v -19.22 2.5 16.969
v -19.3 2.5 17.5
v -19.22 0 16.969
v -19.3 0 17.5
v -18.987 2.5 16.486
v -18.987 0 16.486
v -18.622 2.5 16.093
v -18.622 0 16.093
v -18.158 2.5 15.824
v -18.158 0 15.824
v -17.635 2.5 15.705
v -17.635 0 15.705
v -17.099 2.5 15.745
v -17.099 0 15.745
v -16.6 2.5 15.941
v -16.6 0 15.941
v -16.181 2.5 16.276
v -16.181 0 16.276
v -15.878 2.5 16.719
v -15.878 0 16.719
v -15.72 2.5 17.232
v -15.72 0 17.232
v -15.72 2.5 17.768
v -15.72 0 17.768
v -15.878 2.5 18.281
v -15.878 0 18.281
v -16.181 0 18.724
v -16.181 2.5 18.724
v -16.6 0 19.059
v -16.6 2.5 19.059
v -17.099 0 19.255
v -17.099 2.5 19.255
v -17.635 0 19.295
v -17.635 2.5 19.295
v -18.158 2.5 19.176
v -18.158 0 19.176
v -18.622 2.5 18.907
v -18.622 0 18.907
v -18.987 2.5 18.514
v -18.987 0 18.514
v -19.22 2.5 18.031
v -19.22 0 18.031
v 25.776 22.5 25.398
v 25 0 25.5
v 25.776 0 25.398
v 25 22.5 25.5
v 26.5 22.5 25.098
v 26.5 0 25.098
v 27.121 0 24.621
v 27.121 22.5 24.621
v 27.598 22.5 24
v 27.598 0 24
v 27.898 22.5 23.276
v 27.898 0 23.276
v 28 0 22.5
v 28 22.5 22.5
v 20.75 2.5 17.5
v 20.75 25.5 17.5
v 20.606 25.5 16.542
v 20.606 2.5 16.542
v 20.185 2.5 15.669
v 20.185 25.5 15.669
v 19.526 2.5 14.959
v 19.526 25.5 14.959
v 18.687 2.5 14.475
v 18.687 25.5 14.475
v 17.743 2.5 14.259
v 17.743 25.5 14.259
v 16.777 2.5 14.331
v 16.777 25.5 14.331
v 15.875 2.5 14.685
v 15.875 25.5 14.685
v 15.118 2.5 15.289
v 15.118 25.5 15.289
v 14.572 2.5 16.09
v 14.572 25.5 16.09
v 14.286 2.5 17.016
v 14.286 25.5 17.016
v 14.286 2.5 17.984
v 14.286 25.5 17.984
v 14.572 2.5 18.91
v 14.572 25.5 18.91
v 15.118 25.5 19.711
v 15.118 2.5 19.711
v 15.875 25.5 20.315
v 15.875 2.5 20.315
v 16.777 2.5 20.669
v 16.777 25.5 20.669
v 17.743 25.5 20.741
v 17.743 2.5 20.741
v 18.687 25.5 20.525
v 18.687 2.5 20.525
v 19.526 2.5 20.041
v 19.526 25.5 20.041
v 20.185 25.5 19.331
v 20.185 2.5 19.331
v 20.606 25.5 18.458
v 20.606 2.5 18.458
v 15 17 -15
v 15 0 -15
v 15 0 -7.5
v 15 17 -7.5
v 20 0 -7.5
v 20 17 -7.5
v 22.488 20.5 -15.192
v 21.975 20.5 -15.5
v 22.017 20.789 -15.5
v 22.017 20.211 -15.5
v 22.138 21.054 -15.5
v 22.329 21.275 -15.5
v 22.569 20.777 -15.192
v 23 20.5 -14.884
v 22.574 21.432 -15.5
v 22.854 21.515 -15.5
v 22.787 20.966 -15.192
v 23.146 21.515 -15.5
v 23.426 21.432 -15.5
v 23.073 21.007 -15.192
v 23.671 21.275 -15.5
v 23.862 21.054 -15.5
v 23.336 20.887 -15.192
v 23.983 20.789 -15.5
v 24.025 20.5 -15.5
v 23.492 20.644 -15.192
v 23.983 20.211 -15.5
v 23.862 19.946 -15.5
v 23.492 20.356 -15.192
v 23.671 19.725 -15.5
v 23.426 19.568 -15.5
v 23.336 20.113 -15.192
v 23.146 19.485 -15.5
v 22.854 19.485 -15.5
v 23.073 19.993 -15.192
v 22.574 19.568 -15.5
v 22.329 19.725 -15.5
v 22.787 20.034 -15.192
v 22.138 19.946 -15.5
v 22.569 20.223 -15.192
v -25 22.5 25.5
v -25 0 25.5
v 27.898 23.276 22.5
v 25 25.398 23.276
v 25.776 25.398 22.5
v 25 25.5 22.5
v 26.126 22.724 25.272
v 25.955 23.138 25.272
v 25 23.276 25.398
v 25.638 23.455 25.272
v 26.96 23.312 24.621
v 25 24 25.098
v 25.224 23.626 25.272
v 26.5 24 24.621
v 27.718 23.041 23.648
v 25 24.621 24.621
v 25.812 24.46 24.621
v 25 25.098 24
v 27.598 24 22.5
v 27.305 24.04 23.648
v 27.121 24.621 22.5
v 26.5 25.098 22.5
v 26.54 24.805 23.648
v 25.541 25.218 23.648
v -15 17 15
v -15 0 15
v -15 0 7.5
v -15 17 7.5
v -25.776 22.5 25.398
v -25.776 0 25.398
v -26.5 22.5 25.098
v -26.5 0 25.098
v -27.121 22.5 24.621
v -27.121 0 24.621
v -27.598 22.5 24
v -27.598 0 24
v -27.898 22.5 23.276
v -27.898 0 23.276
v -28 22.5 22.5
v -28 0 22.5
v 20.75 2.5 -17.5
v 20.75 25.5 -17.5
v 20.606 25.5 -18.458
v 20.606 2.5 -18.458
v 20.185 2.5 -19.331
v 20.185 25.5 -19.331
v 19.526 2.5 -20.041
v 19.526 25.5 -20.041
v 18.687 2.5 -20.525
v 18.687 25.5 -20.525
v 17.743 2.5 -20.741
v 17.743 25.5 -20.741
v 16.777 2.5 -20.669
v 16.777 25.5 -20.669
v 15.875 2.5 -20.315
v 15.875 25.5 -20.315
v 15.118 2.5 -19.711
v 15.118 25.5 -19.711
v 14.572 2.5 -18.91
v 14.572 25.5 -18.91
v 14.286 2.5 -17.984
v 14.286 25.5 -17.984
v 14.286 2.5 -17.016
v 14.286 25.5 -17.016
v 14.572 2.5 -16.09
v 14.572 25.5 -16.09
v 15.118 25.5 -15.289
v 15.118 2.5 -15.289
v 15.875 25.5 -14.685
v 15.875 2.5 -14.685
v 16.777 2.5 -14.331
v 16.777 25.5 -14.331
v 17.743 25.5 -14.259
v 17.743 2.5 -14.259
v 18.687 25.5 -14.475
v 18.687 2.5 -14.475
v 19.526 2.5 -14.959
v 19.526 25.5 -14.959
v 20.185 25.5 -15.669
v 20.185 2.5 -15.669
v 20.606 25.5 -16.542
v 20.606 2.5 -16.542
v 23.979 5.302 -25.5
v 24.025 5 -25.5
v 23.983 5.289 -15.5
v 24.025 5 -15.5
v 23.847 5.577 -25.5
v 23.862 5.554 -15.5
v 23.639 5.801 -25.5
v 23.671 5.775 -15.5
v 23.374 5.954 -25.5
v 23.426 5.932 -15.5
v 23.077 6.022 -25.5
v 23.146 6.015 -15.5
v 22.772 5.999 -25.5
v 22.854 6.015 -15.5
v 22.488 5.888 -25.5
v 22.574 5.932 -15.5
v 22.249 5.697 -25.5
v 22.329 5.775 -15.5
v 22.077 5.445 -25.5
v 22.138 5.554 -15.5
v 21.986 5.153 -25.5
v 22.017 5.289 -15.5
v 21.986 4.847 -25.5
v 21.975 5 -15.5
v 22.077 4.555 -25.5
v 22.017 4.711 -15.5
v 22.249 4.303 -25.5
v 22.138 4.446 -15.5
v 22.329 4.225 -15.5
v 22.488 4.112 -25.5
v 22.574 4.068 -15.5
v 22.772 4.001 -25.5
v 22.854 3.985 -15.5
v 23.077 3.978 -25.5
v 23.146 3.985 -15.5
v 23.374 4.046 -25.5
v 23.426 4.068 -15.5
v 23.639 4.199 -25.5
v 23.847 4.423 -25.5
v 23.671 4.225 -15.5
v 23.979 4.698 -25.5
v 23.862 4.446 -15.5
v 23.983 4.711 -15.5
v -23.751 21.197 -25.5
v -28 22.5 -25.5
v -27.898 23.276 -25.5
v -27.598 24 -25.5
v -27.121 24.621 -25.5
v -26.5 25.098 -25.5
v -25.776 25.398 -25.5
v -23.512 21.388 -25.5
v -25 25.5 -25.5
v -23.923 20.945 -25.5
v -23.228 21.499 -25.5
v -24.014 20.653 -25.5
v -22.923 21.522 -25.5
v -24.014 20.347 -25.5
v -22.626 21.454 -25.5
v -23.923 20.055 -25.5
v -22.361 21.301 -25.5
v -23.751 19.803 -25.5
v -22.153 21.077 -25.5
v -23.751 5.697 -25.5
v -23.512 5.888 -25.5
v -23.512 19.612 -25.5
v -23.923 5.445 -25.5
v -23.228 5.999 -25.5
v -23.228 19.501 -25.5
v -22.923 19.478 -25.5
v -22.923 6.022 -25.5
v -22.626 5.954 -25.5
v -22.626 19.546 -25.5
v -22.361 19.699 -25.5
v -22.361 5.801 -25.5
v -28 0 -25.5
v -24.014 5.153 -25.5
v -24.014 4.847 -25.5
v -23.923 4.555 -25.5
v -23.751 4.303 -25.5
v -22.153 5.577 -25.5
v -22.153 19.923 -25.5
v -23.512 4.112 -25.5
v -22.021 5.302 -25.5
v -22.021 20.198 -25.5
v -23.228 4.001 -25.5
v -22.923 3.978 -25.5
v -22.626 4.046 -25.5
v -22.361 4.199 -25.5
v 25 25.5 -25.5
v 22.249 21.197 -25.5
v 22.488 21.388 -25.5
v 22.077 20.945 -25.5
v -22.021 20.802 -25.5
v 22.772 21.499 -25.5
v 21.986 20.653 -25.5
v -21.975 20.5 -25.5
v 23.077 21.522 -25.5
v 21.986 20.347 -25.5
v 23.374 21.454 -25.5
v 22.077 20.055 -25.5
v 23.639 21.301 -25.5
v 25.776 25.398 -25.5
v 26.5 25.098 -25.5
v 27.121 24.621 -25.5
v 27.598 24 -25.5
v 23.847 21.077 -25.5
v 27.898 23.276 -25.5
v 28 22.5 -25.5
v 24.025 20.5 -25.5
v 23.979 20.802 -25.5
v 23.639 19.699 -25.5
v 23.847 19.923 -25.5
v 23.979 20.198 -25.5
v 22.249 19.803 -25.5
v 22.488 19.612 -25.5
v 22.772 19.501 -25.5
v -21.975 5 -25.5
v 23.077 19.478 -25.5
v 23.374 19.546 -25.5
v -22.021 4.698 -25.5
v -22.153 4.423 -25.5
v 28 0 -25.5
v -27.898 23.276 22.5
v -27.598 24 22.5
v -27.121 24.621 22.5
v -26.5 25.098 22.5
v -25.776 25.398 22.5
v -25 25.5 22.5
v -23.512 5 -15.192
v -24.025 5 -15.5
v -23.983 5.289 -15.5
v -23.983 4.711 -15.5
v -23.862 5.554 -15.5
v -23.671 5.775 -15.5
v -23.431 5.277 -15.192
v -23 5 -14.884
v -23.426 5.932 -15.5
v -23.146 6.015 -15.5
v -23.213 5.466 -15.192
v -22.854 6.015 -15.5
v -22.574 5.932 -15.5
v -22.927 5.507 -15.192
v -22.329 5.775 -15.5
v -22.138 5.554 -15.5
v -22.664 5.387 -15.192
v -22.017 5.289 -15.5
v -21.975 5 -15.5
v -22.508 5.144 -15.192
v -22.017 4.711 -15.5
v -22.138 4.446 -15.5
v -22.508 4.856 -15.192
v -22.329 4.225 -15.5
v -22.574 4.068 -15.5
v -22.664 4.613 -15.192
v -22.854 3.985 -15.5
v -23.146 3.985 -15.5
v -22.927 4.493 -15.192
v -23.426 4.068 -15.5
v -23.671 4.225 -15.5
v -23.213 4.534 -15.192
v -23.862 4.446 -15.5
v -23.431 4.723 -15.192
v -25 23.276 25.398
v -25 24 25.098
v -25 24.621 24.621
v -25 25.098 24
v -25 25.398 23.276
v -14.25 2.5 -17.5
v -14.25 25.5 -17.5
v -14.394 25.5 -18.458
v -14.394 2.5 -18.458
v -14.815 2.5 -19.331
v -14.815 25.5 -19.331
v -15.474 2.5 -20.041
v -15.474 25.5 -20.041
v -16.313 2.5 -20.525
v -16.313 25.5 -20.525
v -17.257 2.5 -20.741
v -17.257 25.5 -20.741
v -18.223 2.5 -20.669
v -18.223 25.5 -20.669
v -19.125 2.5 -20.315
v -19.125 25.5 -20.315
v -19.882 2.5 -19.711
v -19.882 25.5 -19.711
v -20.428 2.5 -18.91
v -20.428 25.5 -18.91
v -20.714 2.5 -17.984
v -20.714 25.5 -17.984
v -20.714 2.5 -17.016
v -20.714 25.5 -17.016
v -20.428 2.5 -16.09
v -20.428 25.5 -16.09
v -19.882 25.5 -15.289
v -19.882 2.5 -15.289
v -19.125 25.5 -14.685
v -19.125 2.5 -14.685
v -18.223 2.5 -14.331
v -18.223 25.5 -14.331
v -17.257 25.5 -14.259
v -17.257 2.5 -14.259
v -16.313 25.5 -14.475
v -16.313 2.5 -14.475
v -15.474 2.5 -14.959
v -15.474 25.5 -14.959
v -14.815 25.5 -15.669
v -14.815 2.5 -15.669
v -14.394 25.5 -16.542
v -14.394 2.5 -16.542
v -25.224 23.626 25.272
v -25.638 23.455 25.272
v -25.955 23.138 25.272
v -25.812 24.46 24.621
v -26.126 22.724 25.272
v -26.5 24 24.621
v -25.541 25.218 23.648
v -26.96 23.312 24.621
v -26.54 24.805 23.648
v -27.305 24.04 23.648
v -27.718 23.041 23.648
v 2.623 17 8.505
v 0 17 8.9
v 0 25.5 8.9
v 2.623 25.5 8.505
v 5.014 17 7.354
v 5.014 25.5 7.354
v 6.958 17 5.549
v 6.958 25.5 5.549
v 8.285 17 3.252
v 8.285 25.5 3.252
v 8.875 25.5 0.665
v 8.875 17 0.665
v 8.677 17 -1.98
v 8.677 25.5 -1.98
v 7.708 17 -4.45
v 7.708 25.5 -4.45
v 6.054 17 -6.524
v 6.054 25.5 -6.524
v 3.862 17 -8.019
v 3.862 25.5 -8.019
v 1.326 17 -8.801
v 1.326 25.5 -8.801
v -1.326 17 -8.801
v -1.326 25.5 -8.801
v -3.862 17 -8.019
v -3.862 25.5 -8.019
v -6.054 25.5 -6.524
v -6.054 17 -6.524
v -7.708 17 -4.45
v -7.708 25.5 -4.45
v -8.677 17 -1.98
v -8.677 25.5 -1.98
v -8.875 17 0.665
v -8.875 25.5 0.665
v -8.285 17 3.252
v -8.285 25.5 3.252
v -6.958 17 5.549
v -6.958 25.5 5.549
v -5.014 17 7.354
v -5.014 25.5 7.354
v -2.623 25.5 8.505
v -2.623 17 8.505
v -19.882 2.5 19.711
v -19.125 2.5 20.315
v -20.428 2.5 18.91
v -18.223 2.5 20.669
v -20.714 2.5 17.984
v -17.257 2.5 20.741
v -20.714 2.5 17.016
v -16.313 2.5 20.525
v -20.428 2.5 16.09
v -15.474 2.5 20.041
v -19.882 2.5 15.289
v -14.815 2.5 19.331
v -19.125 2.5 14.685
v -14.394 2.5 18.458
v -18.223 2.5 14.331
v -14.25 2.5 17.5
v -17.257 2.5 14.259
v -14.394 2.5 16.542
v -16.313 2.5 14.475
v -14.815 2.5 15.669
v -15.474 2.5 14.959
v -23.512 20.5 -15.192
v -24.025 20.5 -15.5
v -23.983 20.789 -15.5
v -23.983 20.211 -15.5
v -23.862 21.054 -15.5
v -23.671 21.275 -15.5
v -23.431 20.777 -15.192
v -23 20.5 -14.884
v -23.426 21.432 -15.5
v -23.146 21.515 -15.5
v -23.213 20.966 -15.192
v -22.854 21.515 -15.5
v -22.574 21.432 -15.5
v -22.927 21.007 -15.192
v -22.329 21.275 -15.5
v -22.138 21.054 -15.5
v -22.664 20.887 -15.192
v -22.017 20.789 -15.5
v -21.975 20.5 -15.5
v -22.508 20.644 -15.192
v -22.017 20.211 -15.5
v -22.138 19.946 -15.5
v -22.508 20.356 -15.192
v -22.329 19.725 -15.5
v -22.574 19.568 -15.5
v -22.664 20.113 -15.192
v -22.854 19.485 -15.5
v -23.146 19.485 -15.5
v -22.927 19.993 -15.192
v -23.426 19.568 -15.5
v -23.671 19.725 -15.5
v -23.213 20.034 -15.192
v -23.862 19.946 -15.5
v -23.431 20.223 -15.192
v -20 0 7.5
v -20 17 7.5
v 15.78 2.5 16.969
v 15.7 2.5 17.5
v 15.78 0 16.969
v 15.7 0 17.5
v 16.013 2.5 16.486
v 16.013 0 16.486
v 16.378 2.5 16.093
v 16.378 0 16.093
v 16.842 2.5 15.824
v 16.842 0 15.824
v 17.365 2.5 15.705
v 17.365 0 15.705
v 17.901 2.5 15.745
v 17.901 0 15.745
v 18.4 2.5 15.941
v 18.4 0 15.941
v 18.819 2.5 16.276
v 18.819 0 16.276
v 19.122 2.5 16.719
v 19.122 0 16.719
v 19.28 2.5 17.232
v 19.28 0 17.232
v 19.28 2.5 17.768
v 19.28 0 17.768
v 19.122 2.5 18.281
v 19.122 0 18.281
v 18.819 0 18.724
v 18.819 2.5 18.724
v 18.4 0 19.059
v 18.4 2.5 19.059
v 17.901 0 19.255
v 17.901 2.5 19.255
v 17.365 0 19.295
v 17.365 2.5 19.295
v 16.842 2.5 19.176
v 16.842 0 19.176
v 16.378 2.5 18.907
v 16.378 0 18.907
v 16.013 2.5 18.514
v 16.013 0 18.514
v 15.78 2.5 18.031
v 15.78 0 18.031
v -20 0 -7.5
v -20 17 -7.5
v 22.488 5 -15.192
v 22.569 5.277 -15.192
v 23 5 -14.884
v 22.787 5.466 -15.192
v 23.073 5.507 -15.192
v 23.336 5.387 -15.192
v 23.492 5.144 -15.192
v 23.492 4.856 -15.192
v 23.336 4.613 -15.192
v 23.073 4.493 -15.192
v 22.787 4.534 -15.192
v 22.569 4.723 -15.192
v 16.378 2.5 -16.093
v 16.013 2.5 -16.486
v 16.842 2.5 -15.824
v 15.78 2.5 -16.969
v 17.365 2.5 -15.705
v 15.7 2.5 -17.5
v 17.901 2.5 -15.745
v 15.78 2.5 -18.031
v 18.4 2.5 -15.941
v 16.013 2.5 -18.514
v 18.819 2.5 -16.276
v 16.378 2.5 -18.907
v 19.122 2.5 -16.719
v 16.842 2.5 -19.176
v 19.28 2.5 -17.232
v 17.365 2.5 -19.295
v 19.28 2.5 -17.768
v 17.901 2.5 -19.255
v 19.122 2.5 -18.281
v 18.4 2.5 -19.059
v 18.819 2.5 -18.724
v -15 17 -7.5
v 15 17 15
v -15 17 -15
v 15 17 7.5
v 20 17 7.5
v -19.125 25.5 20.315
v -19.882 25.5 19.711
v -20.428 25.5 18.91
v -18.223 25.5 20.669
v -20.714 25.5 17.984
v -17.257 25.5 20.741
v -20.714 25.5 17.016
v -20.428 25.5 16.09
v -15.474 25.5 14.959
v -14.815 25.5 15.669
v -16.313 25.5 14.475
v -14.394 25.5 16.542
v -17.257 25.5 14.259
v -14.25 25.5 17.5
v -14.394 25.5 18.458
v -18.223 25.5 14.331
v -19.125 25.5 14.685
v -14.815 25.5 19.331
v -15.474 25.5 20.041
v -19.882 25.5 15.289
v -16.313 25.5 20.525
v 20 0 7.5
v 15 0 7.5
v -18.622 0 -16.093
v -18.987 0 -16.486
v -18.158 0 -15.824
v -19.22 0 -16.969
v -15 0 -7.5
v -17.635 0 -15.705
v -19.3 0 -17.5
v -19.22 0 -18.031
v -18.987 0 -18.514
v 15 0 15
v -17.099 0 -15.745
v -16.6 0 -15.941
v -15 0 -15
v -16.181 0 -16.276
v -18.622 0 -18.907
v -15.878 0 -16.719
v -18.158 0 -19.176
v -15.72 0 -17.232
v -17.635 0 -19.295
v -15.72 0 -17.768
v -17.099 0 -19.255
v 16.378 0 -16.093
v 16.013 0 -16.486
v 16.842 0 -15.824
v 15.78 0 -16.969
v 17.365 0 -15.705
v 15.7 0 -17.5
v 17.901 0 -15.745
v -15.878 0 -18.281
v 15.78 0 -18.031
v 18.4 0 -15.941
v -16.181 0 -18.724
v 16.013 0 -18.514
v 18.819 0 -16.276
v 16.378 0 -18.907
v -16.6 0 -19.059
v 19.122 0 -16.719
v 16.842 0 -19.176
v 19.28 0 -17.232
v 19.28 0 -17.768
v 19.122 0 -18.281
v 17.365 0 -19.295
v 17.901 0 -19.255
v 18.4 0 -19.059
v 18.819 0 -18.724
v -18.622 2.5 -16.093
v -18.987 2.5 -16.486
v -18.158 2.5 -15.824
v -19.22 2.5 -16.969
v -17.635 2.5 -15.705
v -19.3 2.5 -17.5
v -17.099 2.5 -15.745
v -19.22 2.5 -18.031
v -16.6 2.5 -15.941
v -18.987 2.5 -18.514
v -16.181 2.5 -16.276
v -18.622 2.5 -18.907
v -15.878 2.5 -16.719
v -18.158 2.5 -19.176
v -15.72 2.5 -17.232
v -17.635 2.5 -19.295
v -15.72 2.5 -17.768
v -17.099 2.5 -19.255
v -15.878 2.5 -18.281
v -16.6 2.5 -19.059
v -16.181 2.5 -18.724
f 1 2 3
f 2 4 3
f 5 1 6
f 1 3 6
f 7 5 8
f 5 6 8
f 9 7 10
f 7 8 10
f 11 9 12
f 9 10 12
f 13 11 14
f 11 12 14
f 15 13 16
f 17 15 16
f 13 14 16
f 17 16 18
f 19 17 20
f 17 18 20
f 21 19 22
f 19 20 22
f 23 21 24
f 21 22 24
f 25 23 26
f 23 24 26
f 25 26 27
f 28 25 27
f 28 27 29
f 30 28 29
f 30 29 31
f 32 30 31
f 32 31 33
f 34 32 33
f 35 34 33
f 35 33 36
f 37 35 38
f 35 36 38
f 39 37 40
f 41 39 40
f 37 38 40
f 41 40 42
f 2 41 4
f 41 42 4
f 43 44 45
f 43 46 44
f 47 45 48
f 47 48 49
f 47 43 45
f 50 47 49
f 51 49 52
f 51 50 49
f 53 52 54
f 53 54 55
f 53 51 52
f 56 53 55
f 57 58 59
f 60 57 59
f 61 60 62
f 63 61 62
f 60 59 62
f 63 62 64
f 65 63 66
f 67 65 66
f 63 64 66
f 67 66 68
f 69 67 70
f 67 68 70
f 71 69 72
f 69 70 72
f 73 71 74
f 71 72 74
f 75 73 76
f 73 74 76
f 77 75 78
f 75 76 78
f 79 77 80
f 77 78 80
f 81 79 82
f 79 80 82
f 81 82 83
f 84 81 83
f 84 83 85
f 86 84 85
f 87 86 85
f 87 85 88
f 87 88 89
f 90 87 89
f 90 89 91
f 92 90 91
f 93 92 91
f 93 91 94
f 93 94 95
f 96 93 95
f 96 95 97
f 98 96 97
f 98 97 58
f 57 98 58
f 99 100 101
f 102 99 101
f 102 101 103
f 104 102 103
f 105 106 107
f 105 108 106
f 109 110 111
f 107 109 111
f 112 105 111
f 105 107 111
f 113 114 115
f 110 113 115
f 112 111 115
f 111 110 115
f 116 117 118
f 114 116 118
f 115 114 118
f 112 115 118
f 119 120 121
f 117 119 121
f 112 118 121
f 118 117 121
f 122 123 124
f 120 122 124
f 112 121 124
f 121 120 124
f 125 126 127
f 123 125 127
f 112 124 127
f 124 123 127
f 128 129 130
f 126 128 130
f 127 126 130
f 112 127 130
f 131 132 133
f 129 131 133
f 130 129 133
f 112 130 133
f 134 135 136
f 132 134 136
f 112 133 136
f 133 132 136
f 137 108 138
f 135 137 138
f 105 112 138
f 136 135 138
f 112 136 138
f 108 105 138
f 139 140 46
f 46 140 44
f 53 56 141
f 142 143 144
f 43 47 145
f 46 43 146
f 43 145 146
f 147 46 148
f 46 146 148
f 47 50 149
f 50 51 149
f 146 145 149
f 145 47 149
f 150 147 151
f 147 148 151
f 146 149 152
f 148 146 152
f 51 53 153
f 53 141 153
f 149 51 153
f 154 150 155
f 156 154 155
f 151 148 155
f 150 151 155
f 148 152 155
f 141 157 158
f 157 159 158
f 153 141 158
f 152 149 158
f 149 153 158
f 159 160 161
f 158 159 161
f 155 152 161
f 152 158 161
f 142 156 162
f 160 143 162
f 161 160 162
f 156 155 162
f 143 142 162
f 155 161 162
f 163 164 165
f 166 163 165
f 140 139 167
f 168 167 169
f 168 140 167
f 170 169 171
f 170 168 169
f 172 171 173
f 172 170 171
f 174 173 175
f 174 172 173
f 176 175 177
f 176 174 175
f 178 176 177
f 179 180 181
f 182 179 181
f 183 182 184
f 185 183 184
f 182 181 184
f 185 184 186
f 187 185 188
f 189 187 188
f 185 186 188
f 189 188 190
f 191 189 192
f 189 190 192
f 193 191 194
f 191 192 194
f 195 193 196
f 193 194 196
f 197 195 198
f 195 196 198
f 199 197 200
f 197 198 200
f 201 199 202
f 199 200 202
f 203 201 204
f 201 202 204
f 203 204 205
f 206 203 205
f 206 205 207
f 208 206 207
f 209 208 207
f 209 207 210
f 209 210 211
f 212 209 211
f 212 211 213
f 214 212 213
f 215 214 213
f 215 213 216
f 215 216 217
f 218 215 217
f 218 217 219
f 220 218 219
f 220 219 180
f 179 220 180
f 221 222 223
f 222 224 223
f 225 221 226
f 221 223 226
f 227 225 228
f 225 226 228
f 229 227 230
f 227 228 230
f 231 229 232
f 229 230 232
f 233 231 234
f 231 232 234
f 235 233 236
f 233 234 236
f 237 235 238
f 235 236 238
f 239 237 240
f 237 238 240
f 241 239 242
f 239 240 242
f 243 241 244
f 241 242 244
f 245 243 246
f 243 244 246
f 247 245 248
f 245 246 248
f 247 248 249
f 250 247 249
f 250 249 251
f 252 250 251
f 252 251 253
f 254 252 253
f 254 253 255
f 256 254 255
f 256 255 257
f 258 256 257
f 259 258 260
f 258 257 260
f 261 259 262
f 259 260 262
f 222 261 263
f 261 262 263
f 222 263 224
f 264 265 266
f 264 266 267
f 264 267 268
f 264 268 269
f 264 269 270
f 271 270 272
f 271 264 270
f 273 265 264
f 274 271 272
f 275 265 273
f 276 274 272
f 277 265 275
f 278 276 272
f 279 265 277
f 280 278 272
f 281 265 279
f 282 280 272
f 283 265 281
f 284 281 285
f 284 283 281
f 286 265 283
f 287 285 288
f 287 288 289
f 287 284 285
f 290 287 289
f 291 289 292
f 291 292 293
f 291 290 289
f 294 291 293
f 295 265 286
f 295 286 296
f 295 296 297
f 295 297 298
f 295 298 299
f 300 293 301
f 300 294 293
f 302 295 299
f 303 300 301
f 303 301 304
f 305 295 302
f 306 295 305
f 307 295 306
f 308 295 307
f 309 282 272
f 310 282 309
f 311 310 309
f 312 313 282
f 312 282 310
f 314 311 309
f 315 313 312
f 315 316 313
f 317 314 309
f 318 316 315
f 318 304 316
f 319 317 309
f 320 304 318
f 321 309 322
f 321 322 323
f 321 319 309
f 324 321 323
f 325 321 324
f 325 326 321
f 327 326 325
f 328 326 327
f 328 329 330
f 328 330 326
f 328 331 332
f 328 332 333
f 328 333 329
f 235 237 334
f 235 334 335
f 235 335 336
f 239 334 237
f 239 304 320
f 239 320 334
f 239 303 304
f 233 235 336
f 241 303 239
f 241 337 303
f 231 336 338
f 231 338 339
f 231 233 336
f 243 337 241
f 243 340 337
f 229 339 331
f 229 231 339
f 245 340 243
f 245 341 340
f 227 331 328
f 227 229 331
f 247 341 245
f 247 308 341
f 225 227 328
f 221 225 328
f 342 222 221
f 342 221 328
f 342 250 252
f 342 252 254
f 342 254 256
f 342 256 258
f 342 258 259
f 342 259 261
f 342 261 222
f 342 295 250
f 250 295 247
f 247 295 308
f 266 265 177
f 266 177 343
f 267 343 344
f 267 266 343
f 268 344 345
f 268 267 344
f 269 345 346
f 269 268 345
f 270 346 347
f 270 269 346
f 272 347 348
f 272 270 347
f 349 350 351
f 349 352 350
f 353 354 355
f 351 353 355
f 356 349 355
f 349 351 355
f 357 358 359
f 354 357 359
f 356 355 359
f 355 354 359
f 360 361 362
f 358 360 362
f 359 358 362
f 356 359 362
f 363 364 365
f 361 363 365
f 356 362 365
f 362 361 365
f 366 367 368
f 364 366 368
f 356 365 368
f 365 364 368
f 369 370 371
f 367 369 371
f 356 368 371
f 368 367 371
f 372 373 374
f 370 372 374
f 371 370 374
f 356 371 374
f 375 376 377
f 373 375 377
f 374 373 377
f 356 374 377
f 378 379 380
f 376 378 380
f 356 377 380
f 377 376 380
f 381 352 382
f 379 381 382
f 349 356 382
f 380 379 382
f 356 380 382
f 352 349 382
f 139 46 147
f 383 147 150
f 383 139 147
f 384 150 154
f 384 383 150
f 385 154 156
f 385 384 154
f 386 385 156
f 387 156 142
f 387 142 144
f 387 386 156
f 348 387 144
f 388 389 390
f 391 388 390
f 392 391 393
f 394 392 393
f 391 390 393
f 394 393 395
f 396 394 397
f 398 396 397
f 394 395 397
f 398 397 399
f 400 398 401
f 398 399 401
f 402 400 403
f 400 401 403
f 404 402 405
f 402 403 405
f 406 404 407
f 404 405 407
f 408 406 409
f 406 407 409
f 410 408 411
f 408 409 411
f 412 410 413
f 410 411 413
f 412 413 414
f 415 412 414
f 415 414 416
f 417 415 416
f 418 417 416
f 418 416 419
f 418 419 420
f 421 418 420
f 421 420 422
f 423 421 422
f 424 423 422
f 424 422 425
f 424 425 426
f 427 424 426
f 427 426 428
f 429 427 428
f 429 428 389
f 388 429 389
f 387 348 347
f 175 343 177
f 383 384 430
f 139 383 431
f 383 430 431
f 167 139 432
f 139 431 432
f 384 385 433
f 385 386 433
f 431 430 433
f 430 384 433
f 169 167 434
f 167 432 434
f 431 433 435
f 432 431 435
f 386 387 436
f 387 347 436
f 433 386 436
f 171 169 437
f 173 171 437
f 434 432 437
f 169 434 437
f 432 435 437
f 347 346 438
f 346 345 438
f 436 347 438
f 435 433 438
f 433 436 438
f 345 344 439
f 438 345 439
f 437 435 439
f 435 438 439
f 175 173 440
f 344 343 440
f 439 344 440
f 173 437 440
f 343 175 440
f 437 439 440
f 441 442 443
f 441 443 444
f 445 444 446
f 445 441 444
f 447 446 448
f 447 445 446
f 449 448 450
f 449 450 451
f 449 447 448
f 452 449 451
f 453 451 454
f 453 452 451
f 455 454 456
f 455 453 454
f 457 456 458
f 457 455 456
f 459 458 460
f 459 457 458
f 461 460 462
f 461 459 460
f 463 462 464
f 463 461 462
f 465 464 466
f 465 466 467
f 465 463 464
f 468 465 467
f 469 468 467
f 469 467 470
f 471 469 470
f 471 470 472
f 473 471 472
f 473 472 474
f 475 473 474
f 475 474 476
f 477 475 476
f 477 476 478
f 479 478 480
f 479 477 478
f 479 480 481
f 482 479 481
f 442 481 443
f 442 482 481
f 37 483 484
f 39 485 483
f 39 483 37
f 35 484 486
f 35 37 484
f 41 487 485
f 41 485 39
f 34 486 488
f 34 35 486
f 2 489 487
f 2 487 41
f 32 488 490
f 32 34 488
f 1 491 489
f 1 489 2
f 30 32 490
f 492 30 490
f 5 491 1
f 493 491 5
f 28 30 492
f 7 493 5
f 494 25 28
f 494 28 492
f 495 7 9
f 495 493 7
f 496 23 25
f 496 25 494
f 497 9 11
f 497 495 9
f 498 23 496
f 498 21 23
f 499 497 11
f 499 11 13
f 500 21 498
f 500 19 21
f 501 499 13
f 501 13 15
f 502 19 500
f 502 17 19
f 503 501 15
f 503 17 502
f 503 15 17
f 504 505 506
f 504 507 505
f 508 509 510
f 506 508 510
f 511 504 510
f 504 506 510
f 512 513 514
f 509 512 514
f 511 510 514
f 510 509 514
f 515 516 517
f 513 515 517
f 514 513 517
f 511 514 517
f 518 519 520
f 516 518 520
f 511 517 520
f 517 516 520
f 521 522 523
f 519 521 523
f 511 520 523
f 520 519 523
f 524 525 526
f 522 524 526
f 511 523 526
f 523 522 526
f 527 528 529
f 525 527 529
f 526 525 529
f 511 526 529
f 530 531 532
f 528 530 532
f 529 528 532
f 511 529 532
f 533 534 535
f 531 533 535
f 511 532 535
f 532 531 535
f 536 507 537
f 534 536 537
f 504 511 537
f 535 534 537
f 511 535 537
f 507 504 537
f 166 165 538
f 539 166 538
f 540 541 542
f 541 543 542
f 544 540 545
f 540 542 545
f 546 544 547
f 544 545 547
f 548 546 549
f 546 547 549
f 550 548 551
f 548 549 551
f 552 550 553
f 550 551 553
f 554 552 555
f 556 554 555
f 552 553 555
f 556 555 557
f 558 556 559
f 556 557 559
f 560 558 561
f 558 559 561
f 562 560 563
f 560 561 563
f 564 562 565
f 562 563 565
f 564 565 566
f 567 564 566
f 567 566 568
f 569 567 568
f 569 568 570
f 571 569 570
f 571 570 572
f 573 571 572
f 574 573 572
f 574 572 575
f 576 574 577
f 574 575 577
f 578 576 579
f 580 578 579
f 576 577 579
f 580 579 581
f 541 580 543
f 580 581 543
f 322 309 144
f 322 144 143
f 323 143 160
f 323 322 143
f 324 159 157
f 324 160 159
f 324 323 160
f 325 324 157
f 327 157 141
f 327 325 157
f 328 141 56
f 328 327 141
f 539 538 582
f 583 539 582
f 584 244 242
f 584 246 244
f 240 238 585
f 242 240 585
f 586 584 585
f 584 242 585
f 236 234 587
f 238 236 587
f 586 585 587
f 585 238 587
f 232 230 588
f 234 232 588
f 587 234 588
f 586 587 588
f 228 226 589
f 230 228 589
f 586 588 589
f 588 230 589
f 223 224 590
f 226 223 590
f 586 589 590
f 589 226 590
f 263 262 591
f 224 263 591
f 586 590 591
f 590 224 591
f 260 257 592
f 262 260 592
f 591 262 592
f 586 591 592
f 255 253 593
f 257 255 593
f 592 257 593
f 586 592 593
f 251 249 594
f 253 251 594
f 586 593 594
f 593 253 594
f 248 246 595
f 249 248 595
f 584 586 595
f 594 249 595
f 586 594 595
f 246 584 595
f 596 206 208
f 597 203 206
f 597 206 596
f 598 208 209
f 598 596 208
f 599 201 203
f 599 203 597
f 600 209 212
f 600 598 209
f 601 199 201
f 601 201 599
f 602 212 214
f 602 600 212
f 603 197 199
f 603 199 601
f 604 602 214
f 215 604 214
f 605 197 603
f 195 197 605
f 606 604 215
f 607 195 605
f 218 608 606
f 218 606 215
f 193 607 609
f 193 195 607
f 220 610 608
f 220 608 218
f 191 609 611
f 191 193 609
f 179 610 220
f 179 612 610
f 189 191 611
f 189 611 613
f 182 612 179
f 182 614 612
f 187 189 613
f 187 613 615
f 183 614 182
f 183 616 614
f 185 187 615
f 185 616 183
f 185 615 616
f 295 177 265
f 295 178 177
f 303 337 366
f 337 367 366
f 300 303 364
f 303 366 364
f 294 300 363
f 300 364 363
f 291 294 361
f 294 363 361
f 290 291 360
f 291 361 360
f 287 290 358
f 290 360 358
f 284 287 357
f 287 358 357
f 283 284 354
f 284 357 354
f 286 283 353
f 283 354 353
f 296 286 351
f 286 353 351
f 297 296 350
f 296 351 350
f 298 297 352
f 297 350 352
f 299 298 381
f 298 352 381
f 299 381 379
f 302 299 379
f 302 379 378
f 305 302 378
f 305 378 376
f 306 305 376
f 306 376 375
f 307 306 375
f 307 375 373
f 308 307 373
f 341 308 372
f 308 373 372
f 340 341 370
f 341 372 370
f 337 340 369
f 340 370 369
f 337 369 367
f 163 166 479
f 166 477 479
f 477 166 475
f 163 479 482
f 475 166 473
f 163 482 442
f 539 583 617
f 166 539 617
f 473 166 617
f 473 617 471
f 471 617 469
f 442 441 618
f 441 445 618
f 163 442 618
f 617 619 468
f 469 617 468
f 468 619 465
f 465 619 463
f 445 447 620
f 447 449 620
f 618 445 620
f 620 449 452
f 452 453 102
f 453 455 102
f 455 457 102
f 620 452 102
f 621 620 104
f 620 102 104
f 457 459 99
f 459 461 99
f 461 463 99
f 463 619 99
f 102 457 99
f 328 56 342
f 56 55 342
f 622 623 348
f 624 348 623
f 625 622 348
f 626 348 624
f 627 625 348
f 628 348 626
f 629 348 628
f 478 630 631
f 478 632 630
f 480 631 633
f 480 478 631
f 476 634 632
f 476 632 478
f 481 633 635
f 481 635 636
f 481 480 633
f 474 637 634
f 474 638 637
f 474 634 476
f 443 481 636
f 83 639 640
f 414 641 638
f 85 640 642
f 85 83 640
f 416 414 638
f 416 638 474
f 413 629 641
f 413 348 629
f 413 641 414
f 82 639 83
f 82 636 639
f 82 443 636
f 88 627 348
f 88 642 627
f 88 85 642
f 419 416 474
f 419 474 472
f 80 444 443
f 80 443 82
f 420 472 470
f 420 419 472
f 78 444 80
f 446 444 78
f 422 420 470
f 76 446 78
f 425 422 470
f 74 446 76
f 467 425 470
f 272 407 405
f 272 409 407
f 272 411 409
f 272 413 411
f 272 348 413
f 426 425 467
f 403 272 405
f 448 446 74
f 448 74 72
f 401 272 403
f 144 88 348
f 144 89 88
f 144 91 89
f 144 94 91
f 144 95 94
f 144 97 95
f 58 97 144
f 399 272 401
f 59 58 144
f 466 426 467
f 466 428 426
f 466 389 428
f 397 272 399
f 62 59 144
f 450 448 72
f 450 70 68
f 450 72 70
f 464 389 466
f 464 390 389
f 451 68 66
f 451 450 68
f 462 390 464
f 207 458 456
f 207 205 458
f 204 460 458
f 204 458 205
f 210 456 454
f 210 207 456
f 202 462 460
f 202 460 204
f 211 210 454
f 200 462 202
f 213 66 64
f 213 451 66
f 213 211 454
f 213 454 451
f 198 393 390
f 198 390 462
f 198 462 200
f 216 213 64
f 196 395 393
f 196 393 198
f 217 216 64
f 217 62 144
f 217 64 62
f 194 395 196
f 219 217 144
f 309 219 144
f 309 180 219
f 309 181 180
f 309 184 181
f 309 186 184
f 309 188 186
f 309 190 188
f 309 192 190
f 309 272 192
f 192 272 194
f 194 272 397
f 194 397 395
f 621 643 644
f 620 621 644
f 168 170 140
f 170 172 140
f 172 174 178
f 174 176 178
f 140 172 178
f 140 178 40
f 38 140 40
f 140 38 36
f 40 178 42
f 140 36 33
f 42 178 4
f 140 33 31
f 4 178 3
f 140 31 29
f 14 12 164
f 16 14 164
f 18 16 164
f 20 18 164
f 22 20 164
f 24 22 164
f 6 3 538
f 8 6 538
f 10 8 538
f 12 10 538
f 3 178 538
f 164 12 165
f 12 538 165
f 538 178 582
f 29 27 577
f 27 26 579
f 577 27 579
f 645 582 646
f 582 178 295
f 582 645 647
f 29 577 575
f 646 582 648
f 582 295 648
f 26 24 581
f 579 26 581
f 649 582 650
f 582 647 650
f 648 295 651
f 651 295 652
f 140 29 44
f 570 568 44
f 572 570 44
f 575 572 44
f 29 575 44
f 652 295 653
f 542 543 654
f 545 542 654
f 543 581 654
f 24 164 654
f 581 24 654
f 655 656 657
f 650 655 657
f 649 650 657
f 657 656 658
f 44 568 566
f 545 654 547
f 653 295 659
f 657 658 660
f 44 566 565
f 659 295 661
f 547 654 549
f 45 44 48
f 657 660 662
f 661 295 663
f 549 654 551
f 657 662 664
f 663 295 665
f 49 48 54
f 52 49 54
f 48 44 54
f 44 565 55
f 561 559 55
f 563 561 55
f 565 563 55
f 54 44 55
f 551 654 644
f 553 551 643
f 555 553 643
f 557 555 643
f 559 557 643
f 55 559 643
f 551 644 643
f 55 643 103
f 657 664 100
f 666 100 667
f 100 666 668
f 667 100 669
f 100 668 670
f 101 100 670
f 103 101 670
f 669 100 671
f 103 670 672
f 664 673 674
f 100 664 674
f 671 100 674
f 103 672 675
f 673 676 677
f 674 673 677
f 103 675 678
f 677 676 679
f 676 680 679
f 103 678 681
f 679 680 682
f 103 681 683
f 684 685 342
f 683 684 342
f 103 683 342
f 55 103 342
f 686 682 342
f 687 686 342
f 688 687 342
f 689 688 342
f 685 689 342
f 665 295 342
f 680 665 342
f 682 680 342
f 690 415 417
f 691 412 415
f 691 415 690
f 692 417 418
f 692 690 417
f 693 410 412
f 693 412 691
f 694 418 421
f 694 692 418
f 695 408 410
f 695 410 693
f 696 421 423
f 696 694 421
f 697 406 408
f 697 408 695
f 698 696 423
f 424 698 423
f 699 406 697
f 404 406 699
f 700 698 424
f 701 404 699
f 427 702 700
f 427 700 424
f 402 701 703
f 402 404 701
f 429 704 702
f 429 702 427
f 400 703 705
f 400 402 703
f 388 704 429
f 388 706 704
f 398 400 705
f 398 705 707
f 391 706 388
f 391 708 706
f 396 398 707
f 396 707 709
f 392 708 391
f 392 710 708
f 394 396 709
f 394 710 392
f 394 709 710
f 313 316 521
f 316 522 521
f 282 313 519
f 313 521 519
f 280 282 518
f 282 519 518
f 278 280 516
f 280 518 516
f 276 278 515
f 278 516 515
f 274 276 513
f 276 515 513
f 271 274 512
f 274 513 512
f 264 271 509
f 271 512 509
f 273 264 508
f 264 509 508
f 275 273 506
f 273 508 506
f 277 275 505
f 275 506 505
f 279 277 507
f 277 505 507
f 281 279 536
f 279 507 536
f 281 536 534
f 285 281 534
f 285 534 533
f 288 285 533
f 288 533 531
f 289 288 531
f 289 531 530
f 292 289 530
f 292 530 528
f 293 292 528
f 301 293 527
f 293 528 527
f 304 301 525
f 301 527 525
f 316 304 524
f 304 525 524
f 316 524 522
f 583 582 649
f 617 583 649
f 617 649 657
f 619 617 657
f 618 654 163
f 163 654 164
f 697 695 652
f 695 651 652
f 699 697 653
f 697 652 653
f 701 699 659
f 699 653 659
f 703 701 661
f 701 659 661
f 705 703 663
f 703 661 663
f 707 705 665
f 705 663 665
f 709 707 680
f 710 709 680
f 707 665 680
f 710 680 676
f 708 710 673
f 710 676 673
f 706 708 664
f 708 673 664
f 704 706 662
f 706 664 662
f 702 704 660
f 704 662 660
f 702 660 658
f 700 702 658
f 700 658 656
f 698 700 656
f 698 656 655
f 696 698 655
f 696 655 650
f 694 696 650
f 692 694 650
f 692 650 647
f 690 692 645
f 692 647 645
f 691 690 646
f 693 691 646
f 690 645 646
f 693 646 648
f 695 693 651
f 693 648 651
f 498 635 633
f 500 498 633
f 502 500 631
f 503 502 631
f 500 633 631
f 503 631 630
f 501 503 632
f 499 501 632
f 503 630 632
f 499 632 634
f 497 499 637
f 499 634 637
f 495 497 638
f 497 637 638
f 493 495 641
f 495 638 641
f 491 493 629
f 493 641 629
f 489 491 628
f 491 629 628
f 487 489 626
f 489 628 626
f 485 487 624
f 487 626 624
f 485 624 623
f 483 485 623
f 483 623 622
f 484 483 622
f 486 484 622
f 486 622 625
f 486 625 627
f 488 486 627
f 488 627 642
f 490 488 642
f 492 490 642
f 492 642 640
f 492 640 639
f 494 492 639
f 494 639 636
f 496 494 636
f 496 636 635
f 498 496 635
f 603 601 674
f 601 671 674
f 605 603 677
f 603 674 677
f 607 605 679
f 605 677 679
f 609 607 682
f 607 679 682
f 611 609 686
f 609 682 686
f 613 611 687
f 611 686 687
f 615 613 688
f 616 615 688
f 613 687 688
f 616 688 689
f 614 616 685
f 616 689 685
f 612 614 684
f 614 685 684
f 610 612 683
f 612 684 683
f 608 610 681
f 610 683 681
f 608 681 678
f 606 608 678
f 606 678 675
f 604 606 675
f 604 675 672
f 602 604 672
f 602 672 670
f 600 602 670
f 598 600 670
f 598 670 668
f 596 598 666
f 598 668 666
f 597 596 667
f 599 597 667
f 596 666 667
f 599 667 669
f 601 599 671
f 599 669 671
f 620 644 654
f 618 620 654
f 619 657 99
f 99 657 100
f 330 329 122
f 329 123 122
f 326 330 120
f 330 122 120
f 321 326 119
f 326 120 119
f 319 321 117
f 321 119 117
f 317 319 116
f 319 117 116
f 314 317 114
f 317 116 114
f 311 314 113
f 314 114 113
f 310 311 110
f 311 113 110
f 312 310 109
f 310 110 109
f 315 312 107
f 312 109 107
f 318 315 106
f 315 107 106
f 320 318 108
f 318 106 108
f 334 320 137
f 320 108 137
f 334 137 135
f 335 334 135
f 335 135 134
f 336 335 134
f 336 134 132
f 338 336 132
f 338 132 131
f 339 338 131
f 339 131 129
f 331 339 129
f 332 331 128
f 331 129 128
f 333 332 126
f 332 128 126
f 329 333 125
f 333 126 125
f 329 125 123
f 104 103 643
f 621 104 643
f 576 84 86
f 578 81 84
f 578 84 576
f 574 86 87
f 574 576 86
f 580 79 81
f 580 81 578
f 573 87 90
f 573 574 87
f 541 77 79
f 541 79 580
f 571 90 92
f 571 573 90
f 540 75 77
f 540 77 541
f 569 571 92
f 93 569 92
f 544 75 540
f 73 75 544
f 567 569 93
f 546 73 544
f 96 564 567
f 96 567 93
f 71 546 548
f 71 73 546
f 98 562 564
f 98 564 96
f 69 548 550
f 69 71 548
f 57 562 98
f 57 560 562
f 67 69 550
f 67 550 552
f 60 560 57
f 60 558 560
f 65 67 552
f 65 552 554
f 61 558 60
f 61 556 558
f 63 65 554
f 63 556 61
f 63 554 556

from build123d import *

# Parameters (mm, degrees)
SKETCH1_W                      = 56
SKETCH1_H                      = 51
BOSS_EXTRUDE1_DEPTH            = 17
SKETCH2_W                      = 56
SKETCH2_H                      = 51
SKETCH2_R                      = 8.9
BOSS_EXTRUDE2_DEPTH            = 8.5
CBORE_FOR_M3_SHCS1_D           = 3.6
CBORE_FOR_M3_SHCS1_CBORE_D     = 6.5
CBORE_FOR_M3_SHCS1_CBORE_DEPTH = 23
FILLET3_R                      = 3
M2_5X0_45_TAPPED_HOLE1_D       = 2.05
M2_5X0_45_TAPPED_HOLE1_DEPTH   = 10
M2_5X0_45_TAPPED_HOLE1_TIP     = 0.615882135
FILLET4_R                      = 3


with BuildPart() as part:
    # Sketch1 → Boss-Extrude1 (new body)
    with BuildSketch(Plane(origin=(0, 0, 0), x_dir=(1, 0, 0), z_dir=(0, 1, 0))):
        Rectangle(SKETCH1_W, SKETCH1_H)
        Polygon((15, -15), (-15, -15), (-15, -7.5), (-20, -7.5), (-20, 7.5), (-15, 7.5), (-15, 15), (15, 15), (15, 7.5), (20, 7.5), (20, -7.5), (15, -7.5), align=None, mode=Mode.SUBTRACT)
    extrude(amount=BOSS_EXTRUDE1_DEPTH)

    # Sketch2 → Boss-Extrude2 (add)
    with BuildSketch(Plane(origin=(0, 17, 0), x_dir=(1, 0, 0), z_dir=(0, 1, 0))):
        Rectangle(SKETCH2_W, SKETCH2_H)
        with Locations(Location((0, 0, 0), (0, 0, 270))):
            Circle(SKETCH2_R, mode=Mode.SUBTRACT)
    extrude(amount=BOSS_EXTRUDE2_DEPTH)

    # CBORE for M3 SHCS1 (through all)
    with Locations(Plane(origin=(0, 25.5, 0), x_dir=(1, 0, 0), z_dir=(0, 1, 0))):
        with Locations((-17.5, 17.5), (17.5, 17.5), (17.5, -17.5), (-17.5, -17.5)):
            CounterBoreHole(CBORE_FOR_M3_SHCS1_D / 2, CBORE_FOR_M3_SHCS1_CBORE_D / 2, CBORE_FOR_M3_SHCS1_CBORE_DEPTH)

    # Fillet3
    fillet3_edges = [part.edges().sort_by_distance(p)[0] for p in [
        (-28, 25.5, 0),
        (28, 25.5, 0),
    ]]
    fillet(fillet3_edges, radius=FILLET3_R)

    # M2.5x0.45 Tapped Hole1
    with Locations(Plane(origin=(0, 0, -25.5), x_dir=(-1, 0, 0), z_dir=(0, 0, -1))):
        with Locations((-23, 20.5), (23, 20.5), (-23, 5), (23, 5)):
            Hole(M2_5X0_45_TAPPED_HOLE1_D / 2, depth=M2_5X0_45_TAPPED_HOLE1_DEPTH)
            with Locations((0, 0, -(M2_5X0_45_TAPPED_HOLE1_DEPTH + M2_5X0_45_TAPPED_HOLE1_TIP / 2))):  # 118° drill point
                Cone(0, M2_5X0_45_TAPPED_HOLE1_D / 2, M2_5X0_45_TAPPED_HOLE1_TIP, mode=Mode.SUBTRACT)

    # Fillet4
    fillet4_edges = [part.edges().sort_by_distance(p)[0] for p in [
        (28, 11.25, 25.5),
        (-28, 11.25, 25.5),
        (-27.121320344, 24.621320344, 25.5),
        (27.121320344, 24.621320344, 25.5),
        (0, 25.5, 25.5),
    ]]
    fillet(fillet4_edges, radius=FILLET4_R)


solid = part.part
